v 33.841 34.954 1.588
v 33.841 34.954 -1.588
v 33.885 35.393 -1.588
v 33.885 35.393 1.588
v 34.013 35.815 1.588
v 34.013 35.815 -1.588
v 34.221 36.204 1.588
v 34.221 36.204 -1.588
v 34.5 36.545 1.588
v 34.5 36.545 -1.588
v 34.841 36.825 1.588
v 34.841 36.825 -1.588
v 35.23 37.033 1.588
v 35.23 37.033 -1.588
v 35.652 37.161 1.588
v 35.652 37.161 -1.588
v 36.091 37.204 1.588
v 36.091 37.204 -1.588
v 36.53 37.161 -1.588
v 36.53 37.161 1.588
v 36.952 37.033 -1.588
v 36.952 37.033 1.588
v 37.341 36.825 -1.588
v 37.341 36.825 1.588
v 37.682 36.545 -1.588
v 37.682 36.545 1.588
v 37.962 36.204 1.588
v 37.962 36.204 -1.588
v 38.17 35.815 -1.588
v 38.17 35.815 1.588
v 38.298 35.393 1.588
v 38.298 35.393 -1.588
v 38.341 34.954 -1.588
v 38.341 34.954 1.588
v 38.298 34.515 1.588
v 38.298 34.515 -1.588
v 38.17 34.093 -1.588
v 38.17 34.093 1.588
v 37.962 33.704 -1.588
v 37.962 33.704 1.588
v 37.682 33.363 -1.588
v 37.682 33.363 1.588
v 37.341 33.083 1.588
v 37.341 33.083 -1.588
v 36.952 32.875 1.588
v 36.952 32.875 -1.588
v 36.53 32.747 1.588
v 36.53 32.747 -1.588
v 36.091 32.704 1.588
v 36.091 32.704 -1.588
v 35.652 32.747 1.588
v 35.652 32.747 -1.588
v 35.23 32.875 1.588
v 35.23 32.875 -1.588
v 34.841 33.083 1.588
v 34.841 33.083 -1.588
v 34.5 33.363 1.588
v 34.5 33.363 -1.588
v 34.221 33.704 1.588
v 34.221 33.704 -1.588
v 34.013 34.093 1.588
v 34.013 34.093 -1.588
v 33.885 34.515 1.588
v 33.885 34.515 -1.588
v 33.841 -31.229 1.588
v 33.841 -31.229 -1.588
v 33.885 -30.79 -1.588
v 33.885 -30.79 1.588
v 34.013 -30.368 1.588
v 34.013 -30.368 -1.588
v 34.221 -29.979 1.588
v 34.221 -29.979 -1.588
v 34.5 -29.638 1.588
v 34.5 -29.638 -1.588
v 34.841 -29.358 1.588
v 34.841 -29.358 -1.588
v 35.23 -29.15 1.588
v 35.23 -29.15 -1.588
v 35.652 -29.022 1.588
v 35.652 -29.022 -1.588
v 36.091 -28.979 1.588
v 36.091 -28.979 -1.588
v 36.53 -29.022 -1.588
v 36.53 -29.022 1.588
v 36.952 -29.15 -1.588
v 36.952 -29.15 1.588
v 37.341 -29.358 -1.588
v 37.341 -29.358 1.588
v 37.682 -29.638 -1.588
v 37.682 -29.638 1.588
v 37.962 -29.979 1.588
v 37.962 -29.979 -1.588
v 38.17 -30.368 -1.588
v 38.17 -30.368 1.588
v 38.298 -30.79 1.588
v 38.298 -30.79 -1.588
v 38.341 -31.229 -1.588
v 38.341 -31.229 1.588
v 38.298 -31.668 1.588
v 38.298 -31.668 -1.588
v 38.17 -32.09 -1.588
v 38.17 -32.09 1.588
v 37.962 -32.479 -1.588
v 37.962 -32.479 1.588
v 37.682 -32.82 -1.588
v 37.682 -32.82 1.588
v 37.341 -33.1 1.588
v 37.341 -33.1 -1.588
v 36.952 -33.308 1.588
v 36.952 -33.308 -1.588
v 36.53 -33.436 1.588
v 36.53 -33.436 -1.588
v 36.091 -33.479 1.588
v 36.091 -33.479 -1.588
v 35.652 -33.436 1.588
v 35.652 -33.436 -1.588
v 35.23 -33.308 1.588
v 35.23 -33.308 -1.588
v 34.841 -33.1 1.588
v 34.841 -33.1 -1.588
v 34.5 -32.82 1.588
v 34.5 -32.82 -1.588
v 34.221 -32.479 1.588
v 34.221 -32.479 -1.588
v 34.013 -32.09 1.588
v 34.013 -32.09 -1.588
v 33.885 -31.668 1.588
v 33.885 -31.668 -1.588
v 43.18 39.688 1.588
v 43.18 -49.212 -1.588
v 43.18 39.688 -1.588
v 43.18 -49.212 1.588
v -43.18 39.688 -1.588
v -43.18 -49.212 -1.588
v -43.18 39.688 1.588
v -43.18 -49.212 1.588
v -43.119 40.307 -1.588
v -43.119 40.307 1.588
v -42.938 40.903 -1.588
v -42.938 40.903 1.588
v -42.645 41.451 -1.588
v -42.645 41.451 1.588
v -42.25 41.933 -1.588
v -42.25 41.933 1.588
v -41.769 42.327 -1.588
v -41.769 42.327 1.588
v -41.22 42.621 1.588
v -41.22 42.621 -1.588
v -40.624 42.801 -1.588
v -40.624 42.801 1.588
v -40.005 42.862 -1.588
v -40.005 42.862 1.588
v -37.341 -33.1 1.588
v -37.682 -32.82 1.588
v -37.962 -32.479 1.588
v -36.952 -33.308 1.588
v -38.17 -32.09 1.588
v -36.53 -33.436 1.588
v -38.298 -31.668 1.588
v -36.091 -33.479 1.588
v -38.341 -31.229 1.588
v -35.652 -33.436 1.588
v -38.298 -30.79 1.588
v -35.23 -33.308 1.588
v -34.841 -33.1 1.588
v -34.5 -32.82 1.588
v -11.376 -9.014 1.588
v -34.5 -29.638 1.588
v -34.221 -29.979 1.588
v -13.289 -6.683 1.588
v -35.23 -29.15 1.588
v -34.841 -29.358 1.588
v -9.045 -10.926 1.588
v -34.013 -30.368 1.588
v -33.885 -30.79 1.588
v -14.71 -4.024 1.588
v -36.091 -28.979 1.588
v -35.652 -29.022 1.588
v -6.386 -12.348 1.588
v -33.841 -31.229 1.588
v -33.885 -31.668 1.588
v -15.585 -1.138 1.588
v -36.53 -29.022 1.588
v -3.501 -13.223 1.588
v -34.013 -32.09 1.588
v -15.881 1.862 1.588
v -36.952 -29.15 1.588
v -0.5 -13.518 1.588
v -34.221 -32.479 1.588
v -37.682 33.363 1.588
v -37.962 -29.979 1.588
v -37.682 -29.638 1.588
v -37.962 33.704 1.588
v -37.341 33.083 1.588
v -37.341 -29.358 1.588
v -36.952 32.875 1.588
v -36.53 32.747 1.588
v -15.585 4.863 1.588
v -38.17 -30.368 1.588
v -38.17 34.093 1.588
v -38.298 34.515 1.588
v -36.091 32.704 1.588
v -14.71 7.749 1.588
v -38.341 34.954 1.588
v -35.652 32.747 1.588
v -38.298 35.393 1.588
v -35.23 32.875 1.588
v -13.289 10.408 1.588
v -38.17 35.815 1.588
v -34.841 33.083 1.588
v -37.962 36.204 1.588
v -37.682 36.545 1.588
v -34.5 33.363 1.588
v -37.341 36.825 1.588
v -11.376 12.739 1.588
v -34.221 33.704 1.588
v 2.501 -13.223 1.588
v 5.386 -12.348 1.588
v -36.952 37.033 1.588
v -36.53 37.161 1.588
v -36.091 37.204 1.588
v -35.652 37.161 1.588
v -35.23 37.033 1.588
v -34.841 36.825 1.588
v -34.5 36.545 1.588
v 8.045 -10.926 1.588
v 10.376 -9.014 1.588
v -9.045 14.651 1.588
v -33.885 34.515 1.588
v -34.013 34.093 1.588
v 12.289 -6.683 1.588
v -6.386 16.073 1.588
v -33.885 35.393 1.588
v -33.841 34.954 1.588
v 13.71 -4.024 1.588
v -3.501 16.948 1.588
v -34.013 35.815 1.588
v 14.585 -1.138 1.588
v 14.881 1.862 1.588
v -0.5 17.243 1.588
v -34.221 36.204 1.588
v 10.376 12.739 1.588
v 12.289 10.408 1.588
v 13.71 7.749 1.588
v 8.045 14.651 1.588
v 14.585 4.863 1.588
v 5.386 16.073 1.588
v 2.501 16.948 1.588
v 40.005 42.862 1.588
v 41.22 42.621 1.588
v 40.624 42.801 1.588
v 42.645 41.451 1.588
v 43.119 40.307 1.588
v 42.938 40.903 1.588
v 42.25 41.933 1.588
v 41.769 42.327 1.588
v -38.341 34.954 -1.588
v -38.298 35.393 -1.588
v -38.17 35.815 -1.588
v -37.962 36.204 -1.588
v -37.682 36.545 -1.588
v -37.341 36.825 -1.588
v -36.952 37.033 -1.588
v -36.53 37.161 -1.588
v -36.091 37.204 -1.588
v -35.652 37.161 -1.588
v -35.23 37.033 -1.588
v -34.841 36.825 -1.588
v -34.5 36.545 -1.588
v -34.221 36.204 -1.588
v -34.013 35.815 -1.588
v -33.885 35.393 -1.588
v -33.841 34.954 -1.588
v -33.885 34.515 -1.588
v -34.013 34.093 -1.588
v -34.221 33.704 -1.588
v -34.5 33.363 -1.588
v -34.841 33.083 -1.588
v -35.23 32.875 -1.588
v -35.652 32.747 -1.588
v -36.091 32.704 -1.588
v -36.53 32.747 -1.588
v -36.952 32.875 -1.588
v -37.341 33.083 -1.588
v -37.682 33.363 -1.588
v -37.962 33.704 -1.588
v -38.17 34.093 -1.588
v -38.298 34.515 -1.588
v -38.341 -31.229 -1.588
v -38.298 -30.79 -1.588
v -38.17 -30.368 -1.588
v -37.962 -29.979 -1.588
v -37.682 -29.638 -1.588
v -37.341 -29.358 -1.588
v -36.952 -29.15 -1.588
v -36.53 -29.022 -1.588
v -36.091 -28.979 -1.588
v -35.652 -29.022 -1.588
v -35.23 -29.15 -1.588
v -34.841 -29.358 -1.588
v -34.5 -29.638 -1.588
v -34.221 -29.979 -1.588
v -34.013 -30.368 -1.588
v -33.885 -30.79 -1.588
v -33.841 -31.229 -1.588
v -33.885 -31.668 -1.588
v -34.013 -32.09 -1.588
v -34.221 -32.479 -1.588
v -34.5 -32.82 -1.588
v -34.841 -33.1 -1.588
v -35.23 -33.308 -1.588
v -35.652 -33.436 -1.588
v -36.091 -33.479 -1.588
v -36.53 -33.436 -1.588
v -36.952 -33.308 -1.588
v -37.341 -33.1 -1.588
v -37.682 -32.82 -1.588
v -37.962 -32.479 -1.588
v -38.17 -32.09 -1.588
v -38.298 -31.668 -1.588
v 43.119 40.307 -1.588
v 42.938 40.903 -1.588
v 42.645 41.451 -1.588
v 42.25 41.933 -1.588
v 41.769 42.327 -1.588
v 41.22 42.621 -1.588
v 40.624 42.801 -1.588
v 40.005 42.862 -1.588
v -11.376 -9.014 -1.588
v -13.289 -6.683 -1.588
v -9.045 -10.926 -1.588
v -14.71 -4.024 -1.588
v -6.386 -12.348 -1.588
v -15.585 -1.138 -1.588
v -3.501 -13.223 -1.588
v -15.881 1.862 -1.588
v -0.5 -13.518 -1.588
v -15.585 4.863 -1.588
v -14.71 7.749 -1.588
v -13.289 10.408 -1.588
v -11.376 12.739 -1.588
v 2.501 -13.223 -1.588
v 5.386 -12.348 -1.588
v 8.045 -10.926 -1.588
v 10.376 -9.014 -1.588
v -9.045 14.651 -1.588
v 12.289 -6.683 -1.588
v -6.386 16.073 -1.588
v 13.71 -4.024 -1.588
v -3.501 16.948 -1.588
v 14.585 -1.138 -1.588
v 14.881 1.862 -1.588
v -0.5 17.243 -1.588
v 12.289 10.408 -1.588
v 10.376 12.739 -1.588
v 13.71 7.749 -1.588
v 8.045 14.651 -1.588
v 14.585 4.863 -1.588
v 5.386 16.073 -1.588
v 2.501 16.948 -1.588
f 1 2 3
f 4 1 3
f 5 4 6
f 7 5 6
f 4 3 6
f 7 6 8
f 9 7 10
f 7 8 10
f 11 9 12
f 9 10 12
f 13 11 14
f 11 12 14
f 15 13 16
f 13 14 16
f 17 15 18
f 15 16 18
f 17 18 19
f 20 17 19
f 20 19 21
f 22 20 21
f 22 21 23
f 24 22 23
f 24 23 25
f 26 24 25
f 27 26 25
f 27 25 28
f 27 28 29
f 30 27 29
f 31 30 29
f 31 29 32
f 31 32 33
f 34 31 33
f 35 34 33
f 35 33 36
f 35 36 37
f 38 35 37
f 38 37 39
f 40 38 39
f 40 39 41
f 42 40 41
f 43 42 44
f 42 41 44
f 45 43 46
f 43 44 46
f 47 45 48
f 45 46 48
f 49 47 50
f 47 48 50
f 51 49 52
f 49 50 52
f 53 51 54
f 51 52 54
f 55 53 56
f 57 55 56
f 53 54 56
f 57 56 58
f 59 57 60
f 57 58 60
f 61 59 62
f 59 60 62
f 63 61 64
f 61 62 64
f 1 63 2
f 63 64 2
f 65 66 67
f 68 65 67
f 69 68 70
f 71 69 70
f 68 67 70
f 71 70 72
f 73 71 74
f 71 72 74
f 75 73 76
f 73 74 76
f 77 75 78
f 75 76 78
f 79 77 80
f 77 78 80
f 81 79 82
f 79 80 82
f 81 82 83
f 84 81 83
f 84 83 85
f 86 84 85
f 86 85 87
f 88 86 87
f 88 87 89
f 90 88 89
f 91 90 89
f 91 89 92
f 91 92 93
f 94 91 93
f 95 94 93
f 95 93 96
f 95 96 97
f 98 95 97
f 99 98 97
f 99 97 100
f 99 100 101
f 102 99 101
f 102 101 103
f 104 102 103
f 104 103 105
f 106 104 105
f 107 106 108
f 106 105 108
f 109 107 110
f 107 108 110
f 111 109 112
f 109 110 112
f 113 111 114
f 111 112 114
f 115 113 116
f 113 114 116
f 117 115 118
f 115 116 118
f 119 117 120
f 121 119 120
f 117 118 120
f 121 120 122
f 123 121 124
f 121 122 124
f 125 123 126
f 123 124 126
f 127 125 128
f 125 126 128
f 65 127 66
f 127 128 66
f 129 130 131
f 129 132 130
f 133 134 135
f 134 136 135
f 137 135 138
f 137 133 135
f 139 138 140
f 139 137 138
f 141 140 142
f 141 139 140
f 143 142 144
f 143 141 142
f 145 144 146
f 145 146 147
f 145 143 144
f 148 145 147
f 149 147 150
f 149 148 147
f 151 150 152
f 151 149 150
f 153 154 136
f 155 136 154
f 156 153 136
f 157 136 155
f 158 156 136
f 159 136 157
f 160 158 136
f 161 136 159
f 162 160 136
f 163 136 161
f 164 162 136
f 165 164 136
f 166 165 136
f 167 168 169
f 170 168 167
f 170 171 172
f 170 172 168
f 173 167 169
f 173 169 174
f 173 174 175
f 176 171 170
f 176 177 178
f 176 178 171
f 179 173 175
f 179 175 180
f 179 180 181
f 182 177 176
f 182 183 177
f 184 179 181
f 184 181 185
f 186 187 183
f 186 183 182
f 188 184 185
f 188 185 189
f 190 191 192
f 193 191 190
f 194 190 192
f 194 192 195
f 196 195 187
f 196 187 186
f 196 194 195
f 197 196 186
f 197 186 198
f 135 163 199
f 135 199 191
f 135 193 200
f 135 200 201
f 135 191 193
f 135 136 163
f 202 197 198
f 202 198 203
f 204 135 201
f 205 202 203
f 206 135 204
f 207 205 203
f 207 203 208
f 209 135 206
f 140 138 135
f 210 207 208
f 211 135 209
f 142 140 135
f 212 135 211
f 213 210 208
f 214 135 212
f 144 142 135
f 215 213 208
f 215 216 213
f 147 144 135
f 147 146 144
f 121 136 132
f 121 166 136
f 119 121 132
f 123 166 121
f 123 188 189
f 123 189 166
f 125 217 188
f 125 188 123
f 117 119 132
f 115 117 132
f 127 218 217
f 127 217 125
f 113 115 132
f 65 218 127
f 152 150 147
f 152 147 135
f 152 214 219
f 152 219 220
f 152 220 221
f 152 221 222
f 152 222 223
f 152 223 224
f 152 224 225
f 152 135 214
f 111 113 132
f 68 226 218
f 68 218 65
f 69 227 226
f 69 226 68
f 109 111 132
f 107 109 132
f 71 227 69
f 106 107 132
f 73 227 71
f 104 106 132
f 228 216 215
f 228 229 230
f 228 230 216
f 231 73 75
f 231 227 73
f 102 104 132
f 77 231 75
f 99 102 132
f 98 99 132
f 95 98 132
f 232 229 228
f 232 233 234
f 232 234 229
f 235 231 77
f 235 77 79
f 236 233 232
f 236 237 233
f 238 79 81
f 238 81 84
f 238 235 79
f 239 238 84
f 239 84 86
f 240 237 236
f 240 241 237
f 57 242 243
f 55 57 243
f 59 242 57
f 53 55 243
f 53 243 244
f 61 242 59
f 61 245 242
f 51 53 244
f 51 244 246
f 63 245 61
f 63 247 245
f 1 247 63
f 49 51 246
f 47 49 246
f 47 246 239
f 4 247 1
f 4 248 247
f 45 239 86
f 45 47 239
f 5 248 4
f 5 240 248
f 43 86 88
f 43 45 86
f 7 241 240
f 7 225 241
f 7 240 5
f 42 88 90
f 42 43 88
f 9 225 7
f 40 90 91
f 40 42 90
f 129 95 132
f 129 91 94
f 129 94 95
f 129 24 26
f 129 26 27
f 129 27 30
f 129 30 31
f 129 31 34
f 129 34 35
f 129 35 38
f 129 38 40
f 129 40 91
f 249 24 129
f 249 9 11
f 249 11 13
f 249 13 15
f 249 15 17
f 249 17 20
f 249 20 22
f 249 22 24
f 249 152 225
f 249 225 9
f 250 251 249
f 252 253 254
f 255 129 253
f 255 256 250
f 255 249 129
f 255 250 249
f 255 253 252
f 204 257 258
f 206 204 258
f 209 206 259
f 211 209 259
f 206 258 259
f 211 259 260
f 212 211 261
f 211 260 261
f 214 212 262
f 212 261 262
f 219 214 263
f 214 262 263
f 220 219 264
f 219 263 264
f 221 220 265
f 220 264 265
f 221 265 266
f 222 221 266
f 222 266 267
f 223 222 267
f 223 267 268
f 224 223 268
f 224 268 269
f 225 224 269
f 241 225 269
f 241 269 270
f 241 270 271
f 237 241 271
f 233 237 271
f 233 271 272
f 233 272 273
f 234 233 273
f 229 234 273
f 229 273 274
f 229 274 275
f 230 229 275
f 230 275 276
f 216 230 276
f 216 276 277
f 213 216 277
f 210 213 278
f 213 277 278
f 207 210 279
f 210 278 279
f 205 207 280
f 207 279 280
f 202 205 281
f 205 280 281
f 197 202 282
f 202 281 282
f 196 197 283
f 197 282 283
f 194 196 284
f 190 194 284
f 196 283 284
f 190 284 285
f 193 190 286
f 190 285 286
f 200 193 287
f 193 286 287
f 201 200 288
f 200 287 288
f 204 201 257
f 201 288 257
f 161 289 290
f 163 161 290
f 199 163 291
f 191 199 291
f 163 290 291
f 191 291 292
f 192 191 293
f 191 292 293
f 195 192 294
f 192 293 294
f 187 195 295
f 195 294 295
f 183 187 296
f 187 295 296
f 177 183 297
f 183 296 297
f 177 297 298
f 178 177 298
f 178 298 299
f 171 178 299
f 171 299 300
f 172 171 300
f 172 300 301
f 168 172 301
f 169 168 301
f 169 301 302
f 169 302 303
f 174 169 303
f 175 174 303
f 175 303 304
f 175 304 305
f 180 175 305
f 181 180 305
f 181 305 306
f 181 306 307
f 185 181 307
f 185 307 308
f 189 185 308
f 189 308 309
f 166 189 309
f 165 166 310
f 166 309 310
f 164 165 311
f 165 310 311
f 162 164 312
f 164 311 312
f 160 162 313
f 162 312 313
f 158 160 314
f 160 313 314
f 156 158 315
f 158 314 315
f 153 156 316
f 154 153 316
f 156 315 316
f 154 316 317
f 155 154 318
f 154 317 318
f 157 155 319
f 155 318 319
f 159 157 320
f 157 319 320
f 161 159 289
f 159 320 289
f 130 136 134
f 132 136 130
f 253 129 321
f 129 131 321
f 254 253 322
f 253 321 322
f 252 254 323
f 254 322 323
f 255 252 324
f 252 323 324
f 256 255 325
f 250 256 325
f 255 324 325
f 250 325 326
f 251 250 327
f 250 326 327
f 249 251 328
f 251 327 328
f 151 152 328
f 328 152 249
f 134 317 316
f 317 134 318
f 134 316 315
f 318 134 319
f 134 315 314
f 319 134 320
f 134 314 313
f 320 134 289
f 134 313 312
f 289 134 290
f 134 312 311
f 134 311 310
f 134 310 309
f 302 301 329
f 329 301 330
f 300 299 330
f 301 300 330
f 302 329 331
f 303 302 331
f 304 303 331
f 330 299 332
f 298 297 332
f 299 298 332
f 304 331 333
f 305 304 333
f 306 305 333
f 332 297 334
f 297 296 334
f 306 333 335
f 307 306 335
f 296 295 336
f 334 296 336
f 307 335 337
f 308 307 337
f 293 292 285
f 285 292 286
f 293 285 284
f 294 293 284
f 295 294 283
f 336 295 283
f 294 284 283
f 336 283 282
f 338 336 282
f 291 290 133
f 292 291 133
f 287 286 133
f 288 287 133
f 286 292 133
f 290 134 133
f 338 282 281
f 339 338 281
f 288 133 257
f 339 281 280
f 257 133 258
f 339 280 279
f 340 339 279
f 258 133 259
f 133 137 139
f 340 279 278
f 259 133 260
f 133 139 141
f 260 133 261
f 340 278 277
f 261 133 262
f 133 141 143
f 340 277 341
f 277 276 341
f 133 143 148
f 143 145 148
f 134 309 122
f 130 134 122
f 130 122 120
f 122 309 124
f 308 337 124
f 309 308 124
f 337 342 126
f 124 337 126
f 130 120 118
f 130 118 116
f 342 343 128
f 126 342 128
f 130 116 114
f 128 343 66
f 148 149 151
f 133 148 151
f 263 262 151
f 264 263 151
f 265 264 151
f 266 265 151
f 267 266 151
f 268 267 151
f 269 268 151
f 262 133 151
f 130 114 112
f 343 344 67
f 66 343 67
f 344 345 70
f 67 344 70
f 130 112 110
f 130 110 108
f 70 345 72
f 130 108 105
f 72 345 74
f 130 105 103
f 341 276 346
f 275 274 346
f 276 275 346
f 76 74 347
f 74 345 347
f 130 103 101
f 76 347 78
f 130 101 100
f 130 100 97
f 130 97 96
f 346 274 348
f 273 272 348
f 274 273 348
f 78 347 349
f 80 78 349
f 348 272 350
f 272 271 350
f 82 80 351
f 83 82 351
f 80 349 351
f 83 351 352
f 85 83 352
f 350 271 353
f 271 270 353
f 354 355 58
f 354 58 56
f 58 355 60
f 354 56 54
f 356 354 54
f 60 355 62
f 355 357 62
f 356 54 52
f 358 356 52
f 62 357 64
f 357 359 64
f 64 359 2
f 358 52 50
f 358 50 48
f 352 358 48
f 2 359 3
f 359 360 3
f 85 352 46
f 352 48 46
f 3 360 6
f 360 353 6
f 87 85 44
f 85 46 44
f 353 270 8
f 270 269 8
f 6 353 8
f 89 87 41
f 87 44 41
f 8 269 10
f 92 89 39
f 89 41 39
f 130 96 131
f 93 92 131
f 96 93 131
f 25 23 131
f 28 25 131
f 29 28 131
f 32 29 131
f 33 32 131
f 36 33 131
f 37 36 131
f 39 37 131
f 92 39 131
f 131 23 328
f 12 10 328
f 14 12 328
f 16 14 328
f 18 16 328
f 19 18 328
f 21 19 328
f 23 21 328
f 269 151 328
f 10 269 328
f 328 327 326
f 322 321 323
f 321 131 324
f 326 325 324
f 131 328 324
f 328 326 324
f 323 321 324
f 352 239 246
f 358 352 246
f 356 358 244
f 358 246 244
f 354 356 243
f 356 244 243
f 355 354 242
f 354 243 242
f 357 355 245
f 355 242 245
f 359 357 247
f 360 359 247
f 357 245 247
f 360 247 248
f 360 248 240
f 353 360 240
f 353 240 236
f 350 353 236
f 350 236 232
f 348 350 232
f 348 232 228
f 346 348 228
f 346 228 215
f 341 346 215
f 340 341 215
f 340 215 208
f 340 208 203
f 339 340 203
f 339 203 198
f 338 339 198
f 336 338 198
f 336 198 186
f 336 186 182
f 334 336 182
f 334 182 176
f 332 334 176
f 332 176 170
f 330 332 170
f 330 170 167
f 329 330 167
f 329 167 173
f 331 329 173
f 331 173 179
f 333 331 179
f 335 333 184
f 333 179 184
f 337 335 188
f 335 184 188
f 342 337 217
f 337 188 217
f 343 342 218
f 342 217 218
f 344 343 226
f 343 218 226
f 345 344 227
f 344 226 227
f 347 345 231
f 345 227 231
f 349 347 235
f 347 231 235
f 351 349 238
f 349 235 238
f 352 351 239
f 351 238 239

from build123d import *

# Parameters (mm, degrees)
SKETCH2_W            = 86.36
SKETCH2_H            = 85.725
BOSS_EXTRUDE1_DEPTH  = 1.5875
SKETCH3_R            = 15.380999972
CUT_EXTRUDE1_DEPTH   = 61.924436241
M4_CLEARANCE_HOLE1_D = 4.5
SKETCH5_W            = 86.36
SKETCH5_H            = 6.35
BOSS_EXTRUDE2_DEPTH  = 3.175
FILLET1_R            = 3.175


with BuildPart() as part:
    # Sketch2 → Boss-Extrude1 (new, symmetric)
    with BuildSketch(Plane.XY):
        Rectangle(SKETCH2_W, SKETCH2_H)
    extrude(amount=BOSS_EXTRUDE1_DEPTH, both=True)

    # Sketch3 → Cut-Extrude1 (cut, through all)
    with BuildSketch(Plane.XY.offset(1.5875)):
        with Locations((-0.5, 1.8625)):
            Circle(SKETCH3_R)
    extrude(amount=-CUT_EXTRUDE1_DEPTH, mode=Mode.SUBTRACT)

    # M4 Clearance Hole1 (through all)
    with Locations(Plane(origin=(36.09137025, 34.95387025, 1.5875), x_dir=(1, 0, 0), z_dir=(0, 0, 1))):
        with Locations((0, 0), (0, -66.1827405), (-72.1827405, 0), (-72.1827405, -66.1827405)):
            Hole(M4_CLEARANCE_HOLE1_D / 2)

    # Sketch5 → Boss-Extrude2 (add)
    with BuildSketch(Plane.XY.offset(1.5875)):
        with Locations((0, -46.0375)):
            Rectangle(SKETCH5_W, SKETCH5_H)
    extrude(amount=-BOSS_EXTRUDE2_DEPTH)

    # Fillet1
    fillet1_edges = [part.edges().sort_by_distance(p)[0] for p in [
        (-43.18, 42.8625, 0),
        (43.18, 42.8625, 0),
    ]]
    fillet(fillet1_edges, radius=FILLET1_R)


solid = part.part
